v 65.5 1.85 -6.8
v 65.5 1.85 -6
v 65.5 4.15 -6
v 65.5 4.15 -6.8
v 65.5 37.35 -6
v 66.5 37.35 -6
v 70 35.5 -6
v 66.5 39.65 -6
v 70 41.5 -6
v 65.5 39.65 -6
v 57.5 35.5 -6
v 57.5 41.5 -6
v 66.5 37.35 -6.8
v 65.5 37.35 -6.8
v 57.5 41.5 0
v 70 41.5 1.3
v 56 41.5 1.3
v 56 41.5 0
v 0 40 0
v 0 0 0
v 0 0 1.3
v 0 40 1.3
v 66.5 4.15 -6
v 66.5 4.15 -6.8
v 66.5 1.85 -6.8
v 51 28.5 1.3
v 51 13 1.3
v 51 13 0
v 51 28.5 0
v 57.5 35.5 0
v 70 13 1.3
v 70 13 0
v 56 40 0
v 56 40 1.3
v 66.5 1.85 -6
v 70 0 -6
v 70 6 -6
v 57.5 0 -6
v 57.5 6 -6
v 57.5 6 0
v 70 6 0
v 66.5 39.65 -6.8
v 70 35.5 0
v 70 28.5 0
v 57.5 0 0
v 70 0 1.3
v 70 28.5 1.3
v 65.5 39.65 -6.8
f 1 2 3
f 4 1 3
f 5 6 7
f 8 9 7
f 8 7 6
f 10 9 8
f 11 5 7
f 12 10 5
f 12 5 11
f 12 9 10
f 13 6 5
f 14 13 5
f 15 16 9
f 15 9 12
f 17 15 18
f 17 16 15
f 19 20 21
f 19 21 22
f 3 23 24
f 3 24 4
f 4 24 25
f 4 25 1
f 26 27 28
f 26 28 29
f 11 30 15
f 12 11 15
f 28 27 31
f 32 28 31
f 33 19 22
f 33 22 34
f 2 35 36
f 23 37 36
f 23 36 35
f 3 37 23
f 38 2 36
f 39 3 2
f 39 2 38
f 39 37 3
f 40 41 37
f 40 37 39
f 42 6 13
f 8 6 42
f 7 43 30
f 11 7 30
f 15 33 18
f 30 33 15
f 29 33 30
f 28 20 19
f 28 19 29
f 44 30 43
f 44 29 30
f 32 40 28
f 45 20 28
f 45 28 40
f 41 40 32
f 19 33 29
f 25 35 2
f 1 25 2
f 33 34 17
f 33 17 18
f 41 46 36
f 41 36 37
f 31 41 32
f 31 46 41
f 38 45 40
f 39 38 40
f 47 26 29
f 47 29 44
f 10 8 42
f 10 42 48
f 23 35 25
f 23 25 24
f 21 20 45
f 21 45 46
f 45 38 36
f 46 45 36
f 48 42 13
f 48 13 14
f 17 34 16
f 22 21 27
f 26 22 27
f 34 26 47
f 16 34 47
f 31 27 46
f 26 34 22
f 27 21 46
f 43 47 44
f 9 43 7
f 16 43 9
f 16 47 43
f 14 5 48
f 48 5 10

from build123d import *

# Parameters (mm, degrees)
SKETCH2_W           = 70
SKETCH2_H           = 40
BOSS_EXTRUDE1_DEPTH = 1.3
SKETCH4_W           = 14
SKETCH4_H           = 1.3
BOSS_EXTRUDE3_DEPTH = 1.5
SKETCH8_W           = 12.5
SKETCH8_H           = 6
BOSS_EXTRUDE4_DEPTH = 6
SKETCH9_W           = 1
SKETCH9_H           = 2.3
BOSS_EXTRUDE5_DEPTH = 0.8
SKETCH6_W           = 19
SKETCH6_H           = 15.5
CUT_EXTRUDE1_DEPTH  = 1.3


with BuildPart() as part:
    # Sketch2 → Boss-Extrude1 (new body)
    with BuildSketch(Plane.XY):
        with Locations((35, 20)):
            Rectangle(SKETCH2_W, SKETCH2_H)
    extrude(amount=BOSS_EXTRUDE1_DEPTH)

    # Sketch4 → Boss-Extrude3 (add)
    with BuildSketch(Plane(origin=(0, 40, 0), x_dir=(1, 0, 0), z_dir=(0, 1, 0))):
        with Locations((63, -0.65)):
            Rectangle(SKETCH4_W, SKETCH4_H)
    extrude(amount=BOSS_EXTRUDE3_DEPTH)

    # Sketch8 → Boss-Extrude4 (add)
    with BuildSketch(Plane(origin=(0, 0, 0), x_dir=(-1, 0, 0), z_dir=(0, 0, -1))):
        with Locations((-63.75, 38.5)):
            Rectangle(SKETCH8_W, SKETCH8_H)
        with Locations((-63.75, 3)):
            Rectangle(SKETCH8_W, SKETCH8_H)
    extrude(amount=BOSS_EXTRUDE4_DEPTH)

    # Sketch9 → Boss-Extrude5 (add)
    with BuildSketch(Plane(origin=(0, 0, -6), x_dir=(-1, 0, 0), z_dir=(0, 0, -1))):
        with Locations((-66, 38.5)):
            Rectangle(SKETCH9_W, SKETCH9_H)
        with Locations((-66, 3)):
            Rectangle(SKETCH9_W, SKETCH9_H)
    extrude(amount=BOSS_EXTRUDE5_DEPTH)

    # Sketch6 → Cut-Extrude1 (cut)
    with BuildSketch(Plane.XY.offset(1.3)):
        with Locations((60.5, 20.75)):
            Rectangle(SKETCH6_W, SKETCH6_H)
    extrude(amount=-CUT_EXTRUDE1_DEPTH, mode=Mode.SUBTRACT)


solid = part.part
